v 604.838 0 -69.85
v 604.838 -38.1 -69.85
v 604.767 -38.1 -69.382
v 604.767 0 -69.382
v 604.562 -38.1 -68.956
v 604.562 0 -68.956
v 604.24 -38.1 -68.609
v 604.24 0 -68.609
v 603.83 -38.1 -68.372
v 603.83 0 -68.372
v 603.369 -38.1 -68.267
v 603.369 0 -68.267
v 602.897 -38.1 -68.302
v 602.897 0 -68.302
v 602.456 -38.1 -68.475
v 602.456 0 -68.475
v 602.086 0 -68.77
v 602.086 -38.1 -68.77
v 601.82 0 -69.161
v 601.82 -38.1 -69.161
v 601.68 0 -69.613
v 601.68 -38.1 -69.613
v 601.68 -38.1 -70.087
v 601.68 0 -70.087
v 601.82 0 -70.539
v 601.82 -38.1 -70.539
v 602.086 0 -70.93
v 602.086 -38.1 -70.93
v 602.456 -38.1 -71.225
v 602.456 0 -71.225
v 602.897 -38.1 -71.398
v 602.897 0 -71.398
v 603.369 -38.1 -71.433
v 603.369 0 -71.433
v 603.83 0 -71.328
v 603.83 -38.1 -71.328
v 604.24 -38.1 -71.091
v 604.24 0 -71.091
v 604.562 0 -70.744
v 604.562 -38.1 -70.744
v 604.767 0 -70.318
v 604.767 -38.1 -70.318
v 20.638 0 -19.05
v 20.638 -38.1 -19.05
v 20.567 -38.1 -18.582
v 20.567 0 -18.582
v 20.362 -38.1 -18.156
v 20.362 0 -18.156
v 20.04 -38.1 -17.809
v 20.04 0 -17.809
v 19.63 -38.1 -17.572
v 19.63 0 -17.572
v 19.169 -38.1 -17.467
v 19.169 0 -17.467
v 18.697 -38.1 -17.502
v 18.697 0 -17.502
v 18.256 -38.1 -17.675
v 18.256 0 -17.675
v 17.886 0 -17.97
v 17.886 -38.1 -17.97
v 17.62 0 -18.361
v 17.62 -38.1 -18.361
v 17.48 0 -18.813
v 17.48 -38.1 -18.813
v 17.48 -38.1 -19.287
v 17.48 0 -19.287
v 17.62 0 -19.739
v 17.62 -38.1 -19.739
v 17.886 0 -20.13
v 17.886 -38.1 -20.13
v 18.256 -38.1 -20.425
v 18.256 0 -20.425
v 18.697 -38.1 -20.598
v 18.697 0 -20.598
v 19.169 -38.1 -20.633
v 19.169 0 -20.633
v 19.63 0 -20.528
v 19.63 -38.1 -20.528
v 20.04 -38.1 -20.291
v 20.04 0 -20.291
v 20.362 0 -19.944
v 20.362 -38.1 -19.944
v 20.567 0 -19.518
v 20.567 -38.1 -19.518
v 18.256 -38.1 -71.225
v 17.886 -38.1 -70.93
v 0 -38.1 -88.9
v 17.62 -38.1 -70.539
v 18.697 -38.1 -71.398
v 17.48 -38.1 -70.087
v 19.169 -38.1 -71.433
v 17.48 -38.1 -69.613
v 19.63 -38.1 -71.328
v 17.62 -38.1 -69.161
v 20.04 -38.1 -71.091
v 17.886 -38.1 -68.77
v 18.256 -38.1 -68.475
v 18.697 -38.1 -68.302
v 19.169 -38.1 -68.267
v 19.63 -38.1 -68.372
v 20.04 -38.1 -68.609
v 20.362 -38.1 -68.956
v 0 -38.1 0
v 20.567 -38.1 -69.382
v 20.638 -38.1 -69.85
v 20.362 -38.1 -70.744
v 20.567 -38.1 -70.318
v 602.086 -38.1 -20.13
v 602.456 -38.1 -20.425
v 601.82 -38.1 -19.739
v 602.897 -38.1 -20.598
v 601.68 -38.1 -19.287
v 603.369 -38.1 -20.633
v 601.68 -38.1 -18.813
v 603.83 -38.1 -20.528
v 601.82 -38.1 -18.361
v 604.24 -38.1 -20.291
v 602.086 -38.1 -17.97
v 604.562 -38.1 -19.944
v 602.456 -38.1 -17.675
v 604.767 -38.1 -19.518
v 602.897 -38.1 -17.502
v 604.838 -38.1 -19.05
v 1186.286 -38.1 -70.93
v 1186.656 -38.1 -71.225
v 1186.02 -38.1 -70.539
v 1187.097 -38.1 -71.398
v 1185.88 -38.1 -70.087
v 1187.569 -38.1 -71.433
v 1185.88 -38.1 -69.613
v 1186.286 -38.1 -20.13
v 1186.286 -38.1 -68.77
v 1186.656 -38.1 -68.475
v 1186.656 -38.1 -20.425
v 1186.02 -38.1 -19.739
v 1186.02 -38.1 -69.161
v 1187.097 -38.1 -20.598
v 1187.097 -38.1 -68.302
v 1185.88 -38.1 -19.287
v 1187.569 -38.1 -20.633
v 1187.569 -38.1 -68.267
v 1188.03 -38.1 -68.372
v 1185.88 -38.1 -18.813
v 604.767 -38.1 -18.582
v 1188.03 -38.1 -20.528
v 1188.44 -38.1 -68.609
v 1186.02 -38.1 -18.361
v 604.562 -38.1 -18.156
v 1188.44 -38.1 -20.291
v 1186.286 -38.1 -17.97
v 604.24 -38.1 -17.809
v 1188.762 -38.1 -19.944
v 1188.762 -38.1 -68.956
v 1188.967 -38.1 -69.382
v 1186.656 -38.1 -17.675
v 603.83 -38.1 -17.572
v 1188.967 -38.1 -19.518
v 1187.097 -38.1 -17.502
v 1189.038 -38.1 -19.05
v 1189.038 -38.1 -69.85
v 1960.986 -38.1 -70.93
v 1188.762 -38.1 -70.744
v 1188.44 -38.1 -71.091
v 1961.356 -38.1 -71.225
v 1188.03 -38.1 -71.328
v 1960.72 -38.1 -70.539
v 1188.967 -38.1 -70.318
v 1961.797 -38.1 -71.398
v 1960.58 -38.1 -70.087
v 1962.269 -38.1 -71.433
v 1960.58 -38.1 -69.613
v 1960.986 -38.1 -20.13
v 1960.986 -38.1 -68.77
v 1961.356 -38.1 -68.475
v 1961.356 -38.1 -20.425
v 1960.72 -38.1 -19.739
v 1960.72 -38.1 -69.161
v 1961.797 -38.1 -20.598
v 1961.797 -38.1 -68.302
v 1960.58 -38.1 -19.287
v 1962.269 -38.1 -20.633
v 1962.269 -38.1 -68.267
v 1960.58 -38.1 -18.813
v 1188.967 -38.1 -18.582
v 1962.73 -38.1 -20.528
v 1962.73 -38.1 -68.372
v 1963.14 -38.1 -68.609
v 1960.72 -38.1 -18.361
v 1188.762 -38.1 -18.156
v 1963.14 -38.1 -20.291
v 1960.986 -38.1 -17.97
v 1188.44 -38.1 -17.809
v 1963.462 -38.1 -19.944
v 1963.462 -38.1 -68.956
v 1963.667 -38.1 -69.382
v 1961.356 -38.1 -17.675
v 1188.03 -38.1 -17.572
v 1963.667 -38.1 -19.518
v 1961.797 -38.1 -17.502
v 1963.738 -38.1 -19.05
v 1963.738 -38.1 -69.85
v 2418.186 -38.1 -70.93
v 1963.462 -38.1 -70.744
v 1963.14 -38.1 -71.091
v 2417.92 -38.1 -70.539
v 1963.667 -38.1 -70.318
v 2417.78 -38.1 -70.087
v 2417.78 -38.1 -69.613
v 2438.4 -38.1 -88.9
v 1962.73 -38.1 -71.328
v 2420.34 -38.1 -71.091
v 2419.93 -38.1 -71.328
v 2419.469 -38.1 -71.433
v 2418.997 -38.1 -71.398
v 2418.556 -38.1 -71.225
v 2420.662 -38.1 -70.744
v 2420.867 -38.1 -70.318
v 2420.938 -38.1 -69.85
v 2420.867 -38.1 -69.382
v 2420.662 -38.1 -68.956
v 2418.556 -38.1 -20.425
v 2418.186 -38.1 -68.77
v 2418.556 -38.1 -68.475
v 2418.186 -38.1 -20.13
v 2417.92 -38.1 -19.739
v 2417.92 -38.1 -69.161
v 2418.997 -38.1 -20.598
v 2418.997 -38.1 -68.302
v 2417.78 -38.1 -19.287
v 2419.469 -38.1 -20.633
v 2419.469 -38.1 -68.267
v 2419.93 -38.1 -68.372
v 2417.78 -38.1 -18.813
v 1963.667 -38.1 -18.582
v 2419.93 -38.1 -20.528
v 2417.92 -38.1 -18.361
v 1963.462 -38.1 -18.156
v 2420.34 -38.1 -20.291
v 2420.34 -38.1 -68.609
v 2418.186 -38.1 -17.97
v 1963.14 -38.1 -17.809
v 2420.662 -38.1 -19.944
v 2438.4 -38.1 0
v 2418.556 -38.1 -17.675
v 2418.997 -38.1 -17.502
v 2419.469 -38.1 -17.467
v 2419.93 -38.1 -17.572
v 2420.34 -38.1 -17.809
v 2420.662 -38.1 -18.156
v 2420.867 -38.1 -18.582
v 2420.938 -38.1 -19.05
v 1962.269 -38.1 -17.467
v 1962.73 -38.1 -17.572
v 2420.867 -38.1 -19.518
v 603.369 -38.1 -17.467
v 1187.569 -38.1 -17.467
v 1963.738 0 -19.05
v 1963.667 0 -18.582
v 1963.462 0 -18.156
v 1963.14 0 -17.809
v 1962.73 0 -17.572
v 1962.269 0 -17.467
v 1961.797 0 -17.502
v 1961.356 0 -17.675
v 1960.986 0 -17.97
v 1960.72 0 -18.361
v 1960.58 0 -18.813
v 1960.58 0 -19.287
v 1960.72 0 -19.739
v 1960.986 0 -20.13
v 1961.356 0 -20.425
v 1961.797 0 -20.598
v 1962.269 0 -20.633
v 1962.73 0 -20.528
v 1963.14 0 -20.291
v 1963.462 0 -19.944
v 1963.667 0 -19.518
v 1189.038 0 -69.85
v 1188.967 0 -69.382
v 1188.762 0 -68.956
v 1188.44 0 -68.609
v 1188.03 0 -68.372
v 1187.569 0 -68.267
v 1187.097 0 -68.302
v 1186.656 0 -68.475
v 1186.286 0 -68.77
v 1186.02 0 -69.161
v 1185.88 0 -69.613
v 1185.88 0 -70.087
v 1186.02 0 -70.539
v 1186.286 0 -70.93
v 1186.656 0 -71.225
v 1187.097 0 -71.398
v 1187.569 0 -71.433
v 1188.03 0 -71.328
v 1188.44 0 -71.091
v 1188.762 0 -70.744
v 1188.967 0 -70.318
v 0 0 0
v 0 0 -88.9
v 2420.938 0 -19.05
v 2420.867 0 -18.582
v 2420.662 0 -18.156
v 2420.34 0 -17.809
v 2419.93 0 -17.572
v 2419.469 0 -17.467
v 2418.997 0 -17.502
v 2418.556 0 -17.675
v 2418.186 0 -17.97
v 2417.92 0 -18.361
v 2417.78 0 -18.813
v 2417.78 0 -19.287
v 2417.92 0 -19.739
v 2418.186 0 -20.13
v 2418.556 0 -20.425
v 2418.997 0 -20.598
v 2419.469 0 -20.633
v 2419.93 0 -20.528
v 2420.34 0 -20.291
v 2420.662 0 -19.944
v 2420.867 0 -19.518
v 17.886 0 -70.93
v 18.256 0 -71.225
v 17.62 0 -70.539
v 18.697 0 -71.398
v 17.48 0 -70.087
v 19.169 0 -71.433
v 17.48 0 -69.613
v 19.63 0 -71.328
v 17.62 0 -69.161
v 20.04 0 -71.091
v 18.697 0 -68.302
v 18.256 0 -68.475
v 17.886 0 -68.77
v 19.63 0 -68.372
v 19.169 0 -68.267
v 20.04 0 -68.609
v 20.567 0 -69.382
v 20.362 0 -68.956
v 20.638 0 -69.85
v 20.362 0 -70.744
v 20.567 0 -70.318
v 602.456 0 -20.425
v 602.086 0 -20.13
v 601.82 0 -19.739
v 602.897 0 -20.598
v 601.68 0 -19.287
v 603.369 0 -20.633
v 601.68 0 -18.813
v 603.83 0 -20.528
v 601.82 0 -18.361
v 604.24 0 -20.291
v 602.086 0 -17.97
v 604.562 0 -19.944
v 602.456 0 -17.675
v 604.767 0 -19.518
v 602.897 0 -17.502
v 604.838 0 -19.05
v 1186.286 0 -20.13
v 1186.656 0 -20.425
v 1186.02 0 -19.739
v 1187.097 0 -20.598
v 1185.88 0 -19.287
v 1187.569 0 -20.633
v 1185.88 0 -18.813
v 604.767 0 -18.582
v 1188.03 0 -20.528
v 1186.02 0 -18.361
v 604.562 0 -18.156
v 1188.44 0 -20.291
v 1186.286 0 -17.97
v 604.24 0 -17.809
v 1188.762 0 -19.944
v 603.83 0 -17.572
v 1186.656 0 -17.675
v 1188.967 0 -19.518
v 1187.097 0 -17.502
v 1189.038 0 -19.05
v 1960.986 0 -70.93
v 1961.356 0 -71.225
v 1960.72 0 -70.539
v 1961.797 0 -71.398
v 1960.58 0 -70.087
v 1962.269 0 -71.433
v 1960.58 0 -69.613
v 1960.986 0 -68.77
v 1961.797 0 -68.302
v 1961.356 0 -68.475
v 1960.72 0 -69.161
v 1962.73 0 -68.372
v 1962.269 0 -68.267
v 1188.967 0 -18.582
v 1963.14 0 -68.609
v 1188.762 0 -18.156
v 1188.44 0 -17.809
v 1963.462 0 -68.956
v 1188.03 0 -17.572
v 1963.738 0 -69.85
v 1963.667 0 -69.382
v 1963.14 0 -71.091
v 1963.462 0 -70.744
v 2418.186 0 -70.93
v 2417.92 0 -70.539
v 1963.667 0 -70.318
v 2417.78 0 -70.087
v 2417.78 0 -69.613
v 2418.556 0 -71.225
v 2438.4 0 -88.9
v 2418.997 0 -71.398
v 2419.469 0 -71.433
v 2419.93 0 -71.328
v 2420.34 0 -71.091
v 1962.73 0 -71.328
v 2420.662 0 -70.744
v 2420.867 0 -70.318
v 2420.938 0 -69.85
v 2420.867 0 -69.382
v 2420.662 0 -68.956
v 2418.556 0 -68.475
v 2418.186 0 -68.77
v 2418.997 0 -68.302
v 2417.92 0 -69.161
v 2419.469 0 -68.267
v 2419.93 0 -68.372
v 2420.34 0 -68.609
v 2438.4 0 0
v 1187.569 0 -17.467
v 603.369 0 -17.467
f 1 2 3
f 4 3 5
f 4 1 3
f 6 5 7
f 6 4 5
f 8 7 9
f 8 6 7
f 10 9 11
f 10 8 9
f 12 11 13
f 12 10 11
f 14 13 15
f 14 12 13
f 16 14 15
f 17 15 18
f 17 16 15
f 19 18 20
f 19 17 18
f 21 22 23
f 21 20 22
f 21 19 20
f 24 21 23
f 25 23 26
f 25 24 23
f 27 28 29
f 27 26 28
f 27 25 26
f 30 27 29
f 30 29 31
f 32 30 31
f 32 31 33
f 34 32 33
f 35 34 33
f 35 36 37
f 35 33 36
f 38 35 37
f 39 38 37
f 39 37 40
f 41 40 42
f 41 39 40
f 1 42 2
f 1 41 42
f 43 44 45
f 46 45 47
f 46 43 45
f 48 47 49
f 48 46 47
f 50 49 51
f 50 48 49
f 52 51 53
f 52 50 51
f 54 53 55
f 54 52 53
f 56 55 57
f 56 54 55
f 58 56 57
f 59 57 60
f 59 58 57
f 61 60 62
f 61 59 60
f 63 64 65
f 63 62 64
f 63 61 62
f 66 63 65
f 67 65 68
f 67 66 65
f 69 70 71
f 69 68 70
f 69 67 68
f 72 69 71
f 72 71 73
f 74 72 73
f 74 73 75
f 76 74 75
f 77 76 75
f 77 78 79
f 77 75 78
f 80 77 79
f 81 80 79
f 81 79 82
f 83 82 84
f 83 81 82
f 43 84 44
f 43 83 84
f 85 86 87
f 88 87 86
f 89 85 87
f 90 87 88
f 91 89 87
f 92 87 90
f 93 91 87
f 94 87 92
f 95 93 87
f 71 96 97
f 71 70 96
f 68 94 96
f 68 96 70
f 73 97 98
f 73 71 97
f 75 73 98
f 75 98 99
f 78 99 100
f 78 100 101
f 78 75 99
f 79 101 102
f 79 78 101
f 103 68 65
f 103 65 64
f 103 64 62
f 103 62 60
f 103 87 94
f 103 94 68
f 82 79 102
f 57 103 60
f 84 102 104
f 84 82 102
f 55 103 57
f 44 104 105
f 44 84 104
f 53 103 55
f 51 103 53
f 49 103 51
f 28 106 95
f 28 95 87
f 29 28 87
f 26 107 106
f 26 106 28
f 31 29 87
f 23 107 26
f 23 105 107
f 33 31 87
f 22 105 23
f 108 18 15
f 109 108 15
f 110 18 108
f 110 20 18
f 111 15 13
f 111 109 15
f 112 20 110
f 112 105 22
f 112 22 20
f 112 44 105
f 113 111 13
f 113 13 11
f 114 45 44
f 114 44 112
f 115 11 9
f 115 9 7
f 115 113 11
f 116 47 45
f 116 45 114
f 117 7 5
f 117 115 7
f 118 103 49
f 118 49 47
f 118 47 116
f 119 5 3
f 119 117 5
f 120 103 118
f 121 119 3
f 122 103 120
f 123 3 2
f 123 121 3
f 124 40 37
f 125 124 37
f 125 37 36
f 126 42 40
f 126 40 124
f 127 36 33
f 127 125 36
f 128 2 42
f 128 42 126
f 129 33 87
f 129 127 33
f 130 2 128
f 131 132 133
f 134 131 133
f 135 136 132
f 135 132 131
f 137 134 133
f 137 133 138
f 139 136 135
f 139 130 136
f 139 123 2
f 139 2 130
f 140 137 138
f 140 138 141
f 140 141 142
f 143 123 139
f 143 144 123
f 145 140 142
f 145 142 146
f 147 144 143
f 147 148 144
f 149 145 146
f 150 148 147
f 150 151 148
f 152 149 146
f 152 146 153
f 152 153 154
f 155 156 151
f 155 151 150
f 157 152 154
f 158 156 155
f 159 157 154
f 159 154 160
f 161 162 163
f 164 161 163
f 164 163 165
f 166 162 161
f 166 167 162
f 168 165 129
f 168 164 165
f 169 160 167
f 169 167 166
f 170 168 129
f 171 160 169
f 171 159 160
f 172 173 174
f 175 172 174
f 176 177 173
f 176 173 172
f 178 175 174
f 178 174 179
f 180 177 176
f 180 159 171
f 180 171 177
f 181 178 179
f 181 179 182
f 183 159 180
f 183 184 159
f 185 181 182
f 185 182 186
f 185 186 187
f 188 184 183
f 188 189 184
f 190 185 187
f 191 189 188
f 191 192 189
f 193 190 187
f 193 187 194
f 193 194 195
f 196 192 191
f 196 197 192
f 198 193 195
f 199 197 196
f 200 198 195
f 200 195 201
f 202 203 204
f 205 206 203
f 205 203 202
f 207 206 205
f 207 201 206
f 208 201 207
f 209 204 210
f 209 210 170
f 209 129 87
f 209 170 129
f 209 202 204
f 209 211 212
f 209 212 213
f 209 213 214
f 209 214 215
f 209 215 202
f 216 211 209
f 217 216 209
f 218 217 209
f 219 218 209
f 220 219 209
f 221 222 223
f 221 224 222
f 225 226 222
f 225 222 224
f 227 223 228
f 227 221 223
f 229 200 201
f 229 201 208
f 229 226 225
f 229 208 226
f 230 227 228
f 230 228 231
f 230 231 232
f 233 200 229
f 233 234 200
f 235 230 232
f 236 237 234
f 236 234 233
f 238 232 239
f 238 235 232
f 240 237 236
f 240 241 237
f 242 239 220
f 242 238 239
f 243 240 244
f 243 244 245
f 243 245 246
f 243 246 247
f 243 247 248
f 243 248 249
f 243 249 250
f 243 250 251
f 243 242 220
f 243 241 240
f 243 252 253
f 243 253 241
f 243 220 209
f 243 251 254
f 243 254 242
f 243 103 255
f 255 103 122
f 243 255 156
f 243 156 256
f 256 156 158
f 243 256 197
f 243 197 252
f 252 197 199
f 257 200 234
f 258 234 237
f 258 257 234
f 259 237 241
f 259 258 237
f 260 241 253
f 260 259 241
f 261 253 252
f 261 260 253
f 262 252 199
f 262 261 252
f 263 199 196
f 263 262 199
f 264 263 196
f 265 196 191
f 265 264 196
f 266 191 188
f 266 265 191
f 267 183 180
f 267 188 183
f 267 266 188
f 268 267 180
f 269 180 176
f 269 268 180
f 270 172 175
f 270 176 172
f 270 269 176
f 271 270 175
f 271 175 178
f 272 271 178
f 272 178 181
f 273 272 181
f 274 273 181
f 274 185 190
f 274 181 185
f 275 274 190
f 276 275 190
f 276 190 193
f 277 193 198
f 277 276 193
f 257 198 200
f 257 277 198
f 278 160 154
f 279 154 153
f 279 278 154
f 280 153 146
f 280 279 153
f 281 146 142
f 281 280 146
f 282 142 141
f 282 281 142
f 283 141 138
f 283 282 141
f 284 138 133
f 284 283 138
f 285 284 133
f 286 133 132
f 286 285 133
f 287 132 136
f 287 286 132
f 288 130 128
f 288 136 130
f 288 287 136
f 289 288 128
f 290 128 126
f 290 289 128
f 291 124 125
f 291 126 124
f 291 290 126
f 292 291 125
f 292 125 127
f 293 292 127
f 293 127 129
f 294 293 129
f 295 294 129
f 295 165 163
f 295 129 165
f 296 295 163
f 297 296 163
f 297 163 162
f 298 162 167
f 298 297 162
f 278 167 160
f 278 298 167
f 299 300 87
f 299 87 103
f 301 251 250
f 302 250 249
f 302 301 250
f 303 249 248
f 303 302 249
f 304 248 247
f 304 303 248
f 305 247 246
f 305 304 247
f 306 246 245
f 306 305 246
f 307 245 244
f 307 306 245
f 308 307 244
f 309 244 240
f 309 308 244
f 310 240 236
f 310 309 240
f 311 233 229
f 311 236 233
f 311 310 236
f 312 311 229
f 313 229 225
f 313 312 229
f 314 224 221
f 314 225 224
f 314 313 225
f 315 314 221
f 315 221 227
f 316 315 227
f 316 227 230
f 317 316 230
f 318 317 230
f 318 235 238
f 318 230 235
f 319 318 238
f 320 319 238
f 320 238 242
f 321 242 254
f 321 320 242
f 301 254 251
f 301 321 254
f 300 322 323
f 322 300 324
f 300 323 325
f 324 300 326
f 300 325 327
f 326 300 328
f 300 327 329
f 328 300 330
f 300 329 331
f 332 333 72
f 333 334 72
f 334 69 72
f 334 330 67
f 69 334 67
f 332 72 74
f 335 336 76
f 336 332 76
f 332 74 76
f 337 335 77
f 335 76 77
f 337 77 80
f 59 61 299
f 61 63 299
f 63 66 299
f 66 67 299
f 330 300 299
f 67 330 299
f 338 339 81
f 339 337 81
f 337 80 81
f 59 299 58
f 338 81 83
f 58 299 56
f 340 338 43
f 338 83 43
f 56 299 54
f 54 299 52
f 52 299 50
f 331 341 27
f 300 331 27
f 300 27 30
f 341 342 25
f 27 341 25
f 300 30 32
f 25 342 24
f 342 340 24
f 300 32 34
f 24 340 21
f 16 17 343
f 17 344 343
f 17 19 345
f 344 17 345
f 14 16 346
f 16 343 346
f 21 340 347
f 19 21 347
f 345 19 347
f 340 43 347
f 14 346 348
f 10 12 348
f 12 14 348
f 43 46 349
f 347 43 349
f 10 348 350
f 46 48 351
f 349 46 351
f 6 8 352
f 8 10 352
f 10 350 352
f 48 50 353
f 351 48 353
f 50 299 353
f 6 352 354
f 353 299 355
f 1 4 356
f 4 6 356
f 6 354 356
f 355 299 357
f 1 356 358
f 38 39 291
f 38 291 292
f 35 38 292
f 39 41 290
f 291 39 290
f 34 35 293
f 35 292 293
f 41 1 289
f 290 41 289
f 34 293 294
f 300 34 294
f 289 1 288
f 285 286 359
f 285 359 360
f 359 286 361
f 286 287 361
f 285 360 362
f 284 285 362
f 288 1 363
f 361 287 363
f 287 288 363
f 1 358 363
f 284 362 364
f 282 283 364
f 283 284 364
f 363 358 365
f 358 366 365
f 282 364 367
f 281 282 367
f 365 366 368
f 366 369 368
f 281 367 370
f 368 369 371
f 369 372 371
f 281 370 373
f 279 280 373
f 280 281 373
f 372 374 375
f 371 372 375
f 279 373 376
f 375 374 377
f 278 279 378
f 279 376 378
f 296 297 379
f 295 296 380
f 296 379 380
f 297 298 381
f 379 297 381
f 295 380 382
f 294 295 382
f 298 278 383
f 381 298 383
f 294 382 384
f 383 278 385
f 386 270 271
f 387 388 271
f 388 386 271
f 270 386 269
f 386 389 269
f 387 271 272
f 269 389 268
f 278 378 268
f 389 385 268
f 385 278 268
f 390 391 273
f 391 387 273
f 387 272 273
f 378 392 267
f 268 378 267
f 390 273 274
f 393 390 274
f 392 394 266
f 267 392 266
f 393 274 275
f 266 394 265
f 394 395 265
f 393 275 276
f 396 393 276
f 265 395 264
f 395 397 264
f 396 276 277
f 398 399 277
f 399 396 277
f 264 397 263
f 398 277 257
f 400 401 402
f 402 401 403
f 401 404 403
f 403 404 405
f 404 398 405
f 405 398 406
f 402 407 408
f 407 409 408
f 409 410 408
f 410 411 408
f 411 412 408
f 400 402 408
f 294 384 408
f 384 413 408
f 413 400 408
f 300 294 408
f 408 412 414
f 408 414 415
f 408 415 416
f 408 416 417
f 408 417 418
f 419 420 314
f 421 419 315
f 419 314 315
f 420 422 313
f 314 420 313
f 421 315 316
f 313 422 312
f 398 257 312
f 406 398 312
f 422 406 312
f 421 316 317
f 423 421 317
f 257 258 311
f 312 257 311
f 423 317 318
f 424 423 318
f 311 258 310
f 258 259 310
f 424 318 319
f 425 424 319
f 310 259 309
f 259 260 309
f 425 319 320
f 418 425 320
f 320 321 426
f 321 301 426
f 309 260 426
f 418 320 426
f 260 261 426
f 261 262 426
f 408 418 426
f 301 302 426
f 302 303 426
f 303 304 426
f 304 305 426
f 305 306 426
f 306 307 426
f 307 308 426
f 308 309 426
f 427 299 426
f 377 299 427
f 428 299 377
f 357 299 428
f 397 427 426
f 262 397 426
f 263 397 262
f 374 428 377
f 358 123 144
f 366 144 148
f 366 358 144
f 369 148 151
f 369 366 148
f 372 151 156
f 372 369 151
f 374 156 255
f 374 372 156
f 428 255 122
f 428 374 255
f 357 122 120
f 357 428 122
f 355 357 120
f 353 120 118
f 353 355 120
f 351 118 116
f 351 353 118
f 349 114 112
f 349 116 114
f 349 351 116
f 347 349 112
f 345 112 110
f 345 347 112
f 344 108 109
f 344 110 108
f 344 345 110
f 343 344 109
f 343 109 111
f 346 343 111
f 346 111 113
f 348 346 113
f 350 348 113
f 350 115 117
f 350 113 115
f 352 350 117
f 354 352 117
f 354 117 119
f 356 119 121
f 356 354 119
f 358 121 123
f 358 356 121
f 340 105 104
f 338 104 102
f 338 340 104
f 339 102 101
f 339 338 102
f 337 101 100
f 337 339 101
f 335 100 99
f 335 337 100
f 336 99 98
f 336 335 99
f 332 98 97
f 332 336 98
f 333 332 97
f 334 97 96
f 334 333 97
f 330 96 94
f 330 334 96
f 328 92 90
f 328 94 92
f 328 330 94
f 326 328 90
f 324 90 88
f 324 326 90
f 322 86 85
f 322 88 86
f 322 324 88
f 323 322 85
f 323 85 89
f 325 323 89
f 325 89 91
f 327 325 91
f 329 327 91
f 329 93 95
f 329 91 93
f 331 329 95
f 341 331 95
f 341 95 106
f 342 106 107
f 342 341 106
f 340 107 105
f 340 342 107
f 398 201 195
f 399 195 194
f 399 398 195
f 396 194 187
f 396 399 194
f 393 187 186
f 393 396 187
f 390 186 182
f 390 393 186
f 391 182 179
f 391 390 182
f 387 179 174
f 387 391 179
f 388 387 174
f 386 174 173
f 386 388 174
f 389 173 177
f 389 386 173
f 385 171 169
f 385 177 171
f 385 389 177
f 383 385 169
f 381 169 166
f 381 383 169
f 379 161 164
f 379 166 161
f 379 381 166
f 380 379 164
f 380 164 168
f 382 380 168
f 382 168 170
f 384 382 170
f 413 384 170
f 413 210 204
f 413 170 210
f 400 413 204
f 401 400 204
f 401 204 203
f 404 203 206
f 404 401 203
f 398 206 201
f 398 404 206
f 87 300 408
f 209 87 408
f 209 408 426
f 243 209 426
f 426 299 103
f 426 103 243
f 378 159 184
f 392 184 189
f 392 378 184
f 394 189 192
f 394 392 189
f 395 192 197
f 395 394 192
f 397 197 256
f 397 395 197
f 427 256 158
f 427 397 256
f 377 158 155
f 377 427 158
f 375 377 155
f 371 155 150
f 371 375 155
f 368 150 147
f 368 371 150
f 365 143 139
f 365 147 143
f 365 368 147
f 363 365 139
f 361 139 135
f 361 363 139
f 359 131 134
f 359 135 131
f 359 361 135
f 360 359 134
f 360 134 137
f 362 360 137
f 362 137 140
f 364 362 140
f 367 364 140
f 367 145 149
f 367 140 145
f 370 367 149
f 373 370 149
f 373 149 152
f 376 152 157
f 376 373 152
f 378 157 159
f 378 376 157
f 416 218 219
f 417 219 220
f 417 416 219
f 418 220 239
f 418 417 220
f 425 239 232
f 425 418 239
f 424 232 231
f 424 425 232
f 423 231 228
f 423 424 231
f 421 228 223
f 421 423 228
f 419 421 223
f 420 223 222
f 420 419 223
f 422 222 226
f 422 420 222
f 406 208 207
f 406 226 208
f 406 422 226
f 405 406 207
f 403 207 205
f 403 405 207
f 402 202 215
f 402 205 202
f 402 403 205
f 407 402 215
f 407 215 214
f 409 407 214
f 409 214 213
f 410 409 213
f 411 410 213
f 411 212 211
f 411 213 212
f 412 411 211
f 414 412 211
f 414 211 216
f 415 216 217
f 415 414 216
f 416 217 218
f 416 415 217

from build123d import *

# Parameters (mm, degrees)
F0_W     = 2438.4
F0_H     = 88.9
F1_DEPTH = 38.1
F2_R     = 1.5875
F3_DEPTH = 38.101
F4_R     = 1.5875
F5_DEPTH = 38.101
F6_R     = 1.5875
F7_DEPTH = 38.101


with BuildPart() as f1:
    # F0 (on Front) → F1 (new body)
    with BuildSketch(Plane.XZ):
        with Locations((1219.2, -44.45)):
            Rectangle(F0_W, F0_H)
    extrude(amount=F1_DEPTH)

    # F2 (on Front) → F3 (cut, through all)
    with BuildSketch(Plane.XZ):
        with Locations((19.05, -19.05)):
            Circle(F2_R)
        with Locations((19.05, -69.85)):
            Circle(F2_R)
        with Locations((2419.35, -19.05)):
            Circle(F2_R)
        with Locations((2419.35, -69.85)):
            Circle(F2_R)
        with Locations((4819.65, -19.05)):
            Circle(F2_R)
        with Locations((4819.65, -69.85)):
            Circle(F2_R)
    extrude(amount=F3_DEPTH, mode=Mode.SUBTRACT)

    # F4 (on Front) → F5 (cut, through all)
    with BuildSketch(Plane.XZ):
        with Locations((1187.45, -19.05)):
            Circle(F4_R)
        with Locations((1187.45, -69.85)):
            Circle(F4_R)
        with Locations((1962.15, -19.05)):
            Circle(F4_R)
        with Locations((1962.15, -69.85)):
            Circle(F4_R)
    extrude(amount=F5_DEPTH, mode=Mode.SUBTRACT)

    # F6 (on Front) → F7 (cut, through all)
    with BuildSketch(Plane.XZ):
        with Locations((603.25, -19.05)):
            Circle(F6_R)
        with Locations((603.25, -69.85)):
            Circle(F6_R)
    extrude(amount=F7_DEPTH, mode=Mode.SUBTRACT)


solid = f1.part
